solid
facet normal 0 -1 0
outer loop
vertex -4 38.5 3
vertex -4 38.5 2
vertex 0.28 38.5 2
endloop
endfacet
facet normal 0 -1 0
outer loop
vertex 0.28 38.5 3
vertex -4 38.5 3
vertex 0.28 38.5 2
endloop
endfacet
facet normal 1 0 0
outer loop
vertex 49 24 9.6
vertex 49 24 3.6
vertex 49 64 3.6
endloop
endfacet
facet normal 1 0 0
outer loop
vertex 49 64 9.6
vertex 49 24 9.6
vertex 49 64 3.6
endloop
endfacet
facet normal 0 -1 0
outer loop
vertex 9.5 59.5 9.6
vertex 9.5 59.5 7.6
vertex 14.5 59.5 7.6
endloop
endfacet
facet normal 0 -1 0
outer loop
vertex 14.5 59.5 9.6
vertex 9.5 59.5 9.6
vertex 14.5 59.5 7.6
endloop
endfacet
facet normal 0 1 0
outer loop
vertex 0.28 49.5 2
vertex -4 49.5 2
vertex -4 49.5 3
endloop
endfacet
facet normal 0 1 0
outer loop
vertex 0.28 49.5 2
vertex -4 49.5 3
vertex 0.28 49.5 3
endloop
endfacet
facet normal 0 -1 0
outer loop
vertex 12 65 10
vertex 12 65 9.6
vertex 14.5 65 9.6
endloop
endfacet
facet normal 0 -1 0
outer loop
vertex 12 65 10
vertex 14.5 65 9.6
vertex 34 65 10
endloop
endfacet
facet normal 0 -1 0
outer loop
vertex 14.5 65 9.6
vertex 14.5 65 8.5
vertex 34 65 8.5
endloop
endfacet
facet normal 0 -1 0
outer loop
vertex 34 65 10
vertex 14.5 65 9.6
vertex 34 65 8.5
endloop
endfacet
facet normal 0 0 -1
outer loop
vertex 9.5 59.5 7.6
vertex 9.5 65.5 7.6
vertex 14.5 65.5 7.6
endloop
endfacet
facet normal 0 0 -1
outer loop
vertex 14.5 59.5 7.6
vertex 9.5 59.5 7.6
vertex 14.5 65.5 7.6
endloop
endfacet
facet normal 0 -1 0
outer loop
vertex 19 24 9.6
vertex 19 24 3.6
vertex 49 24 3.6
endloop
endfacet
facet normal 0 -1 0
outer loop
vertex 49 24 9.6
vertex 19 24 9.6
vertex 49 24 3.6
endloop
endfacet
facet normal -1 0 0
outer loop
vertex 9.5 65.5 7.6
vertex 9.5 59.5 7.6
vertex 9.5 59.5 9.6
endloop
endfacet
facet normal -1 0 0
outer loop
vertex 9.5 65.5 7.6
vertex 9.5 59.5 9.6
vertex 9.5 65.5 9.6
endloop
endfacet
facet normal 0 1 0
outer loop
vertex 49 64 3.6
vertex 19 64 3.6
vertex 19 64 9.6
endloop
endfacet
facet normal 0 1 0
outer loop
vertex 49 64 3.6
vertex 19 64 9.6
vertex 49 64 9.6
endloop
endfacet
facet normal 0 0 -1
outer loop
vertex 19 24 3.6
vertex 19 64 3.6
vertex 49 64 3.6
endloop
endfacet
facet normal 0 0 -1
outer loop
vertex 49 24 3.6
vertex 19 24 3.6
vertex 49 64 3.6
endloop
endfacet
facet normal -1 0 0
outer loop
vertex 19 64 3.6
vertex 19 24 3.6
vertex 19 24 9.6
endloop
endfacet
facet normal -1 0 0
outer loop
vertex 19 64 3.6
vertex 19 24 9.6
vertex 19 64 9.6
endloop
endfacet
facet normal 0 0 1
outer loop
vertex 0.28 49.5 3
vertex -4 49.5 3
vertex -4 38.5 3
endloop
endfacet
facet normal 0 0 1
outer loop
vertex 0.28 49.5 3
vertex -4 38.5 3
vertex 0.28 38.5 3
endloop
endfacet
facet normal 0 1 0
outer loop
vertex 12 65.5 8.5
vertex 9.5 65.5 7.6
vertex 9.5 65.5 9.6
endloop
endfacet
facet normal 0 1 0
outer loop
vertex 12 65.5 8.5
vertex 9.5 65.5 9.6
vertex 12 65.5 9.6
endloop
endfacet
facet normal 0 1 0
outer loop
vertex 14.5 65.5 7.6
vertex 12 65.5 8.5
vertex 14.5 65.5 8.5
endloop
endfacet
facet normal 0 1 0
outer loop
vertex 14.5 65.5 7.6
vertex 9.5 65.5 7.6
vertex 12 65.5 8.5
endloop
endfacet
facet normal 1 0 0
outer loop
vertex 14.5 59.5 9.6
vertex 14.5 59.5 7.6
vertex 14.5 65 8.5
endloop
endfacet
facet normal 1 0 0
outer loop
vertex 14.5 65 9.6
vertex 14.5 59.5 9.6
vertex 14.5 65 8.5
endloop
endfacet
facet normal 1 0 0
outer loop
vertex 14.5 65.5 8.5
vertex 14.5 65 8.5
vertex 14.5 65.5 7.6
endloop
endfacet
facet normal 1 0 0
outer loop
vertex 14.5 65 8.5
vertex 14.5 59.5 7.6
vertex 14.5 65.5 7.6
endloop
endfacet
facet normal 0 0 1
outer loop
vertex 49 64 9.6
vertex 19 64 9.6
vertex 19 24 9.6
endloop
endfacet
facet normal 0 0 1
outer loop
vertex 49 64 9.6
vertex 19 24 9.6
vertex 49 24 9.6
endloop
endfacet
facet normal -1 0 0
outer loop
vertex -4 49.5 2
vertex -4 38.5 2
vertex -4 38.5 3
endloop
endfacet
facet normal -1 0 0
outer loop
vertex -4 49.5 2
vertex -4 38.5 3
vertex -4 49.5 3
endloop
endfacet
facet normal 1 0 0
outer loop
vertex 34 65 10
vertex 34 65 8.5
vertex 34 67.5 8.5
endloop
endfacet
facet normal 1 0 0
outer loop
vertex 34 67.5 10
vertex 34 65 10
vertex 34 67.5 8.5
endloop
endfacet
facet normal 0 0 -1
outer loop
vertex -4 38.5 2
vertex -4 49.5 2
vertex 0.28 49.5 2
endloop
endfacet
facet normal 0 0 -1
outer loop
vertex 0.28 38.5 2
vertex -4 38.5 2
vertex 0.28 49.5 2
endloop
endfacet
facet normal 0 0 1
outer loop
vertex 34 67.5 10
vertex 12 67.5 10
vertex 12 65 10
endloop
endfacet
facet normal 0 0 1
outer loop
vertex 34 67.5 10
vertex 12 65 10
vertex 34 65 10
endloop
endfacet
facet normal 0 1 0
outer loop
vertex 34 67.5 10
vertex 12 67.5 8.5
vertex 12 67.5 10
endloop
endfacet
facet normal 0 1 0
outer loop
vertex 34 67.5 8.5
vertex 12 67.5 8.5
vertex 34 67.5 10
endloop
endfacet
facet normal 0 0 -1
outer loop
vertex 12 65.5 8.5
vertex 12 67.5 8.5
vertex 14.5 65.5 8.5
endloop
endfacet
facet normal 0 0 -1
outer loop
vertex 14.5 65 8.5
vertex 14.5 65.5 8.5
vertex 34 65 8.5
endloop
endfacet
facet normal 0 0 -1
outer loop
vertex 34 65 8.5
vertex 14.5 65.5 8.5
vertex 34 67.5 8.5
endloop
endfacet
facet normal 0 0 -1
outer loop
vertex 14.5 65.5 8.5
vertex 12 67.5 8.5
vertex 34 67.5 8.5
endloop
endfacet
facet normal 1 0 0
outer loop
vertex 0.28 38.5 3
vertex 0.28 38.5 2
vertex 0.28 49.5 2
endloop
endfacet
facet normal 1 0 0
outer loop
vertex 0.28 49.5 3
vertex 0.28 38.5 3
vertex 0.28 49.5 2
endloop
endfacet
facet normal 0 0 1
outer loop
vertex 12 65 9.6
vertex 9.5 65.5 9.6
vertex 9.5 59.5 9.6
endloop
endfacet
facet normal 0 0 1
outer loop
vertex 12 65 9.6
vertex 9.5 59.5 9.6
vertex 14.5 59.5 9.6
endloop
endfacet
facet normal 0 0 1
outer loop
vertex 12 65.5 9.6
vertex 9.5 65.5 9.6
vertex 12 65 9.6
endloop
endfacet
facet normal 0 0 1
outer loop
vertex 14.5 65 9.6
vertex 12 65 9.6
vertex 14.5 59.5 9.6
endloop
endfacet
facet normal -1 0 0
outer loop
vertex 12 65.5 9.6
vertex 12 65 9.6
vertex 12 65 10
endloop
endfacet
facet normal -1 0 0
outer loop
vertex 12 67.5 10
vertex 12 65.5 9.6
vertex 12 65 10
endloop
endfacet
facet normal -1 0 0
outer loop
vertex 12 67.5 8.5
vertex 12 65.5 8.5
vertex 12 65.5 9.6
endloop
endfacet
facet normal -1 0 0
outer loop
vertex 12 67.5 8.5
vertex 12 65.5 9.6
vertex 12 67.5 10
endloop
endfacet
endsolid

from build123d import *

# Parameters (mm, degrees)
BATTERY_START                                 = 3.6
SKETCH_1_W                                    = 30
SKETCH_1_H                                    = 40
BATTERY_POUCH_DEPTH                           = 6
BATTERY_START_2                               = 8.5
SKETCH_2_W                                    = 22
SKETCH_2_H                                    = 2.5
BATTERY_LEADS_DEPTH                           = 1.5
JST_START                                     = 7.6
SKETCH_3_W                                    = 5
SKETCH_3_H                                    = 6
JST_PLUG_WIRE_EXIT_BELOW_J4_DEPTH             = 2
MICROSD_START                                 = 2
SKETCH_4_W                                    = 4.28
SKETCH_4_H                                    = 11
MICROSD_CARD_PART_OUTSIDE_THE_CONNECTOR_DEPTH = 1


with BuildPart() as part:
    # 草圖1 → battery pouch (new body)
    with BuildSketch(Plane.XY.offset(BATTERY_START)):
        with Locations((34, 44)):
            Rectangle(SKETCH_1_W, SKETCH_1_H)
    extrude(amount=BATTERY_POUCH_DEPTH)


with BuildPart() as body_2:
    # 草圖2 → battery leads (new body)
    with BuildSketch(Plane.XY.offset(BATTERY_START_2)):
        with Locations((23, 66.25)):
            Rectangle(SKETCH_2_W, SKETCH_2_H)
    extrude(amount=BATTERY_LEADS_DEPTH)

    # 草圖3 → JST plug wire exit below J4 (add)
    with BuildSketch(Plane.XY.offset(JST_START)):
        with Locations((12, 62.5)):
            Rectangle(SKETCH_3_W, SKETCH_3_H)
    extrude(amount=JST_PLUG_WIRE_EXIT_BELOW_J4_DEPTH)


with BuildPart() as body_3:
    # 草圖4 → microSD card, part outside the connector (new body)
    with BuildSketch(Plane.XY.offset(MICROSD_START)):
        with Locations((-1.86, 44)):
            Rectangle(SKETCH_4_W, SKETCH_4_H)
    extrude(amount=MICROSD_CARD_PART_OUTSIDE_THE_CONNECTOR_DEPTH)


solid = Compound([part.part, body_2.part, body_3.part])
